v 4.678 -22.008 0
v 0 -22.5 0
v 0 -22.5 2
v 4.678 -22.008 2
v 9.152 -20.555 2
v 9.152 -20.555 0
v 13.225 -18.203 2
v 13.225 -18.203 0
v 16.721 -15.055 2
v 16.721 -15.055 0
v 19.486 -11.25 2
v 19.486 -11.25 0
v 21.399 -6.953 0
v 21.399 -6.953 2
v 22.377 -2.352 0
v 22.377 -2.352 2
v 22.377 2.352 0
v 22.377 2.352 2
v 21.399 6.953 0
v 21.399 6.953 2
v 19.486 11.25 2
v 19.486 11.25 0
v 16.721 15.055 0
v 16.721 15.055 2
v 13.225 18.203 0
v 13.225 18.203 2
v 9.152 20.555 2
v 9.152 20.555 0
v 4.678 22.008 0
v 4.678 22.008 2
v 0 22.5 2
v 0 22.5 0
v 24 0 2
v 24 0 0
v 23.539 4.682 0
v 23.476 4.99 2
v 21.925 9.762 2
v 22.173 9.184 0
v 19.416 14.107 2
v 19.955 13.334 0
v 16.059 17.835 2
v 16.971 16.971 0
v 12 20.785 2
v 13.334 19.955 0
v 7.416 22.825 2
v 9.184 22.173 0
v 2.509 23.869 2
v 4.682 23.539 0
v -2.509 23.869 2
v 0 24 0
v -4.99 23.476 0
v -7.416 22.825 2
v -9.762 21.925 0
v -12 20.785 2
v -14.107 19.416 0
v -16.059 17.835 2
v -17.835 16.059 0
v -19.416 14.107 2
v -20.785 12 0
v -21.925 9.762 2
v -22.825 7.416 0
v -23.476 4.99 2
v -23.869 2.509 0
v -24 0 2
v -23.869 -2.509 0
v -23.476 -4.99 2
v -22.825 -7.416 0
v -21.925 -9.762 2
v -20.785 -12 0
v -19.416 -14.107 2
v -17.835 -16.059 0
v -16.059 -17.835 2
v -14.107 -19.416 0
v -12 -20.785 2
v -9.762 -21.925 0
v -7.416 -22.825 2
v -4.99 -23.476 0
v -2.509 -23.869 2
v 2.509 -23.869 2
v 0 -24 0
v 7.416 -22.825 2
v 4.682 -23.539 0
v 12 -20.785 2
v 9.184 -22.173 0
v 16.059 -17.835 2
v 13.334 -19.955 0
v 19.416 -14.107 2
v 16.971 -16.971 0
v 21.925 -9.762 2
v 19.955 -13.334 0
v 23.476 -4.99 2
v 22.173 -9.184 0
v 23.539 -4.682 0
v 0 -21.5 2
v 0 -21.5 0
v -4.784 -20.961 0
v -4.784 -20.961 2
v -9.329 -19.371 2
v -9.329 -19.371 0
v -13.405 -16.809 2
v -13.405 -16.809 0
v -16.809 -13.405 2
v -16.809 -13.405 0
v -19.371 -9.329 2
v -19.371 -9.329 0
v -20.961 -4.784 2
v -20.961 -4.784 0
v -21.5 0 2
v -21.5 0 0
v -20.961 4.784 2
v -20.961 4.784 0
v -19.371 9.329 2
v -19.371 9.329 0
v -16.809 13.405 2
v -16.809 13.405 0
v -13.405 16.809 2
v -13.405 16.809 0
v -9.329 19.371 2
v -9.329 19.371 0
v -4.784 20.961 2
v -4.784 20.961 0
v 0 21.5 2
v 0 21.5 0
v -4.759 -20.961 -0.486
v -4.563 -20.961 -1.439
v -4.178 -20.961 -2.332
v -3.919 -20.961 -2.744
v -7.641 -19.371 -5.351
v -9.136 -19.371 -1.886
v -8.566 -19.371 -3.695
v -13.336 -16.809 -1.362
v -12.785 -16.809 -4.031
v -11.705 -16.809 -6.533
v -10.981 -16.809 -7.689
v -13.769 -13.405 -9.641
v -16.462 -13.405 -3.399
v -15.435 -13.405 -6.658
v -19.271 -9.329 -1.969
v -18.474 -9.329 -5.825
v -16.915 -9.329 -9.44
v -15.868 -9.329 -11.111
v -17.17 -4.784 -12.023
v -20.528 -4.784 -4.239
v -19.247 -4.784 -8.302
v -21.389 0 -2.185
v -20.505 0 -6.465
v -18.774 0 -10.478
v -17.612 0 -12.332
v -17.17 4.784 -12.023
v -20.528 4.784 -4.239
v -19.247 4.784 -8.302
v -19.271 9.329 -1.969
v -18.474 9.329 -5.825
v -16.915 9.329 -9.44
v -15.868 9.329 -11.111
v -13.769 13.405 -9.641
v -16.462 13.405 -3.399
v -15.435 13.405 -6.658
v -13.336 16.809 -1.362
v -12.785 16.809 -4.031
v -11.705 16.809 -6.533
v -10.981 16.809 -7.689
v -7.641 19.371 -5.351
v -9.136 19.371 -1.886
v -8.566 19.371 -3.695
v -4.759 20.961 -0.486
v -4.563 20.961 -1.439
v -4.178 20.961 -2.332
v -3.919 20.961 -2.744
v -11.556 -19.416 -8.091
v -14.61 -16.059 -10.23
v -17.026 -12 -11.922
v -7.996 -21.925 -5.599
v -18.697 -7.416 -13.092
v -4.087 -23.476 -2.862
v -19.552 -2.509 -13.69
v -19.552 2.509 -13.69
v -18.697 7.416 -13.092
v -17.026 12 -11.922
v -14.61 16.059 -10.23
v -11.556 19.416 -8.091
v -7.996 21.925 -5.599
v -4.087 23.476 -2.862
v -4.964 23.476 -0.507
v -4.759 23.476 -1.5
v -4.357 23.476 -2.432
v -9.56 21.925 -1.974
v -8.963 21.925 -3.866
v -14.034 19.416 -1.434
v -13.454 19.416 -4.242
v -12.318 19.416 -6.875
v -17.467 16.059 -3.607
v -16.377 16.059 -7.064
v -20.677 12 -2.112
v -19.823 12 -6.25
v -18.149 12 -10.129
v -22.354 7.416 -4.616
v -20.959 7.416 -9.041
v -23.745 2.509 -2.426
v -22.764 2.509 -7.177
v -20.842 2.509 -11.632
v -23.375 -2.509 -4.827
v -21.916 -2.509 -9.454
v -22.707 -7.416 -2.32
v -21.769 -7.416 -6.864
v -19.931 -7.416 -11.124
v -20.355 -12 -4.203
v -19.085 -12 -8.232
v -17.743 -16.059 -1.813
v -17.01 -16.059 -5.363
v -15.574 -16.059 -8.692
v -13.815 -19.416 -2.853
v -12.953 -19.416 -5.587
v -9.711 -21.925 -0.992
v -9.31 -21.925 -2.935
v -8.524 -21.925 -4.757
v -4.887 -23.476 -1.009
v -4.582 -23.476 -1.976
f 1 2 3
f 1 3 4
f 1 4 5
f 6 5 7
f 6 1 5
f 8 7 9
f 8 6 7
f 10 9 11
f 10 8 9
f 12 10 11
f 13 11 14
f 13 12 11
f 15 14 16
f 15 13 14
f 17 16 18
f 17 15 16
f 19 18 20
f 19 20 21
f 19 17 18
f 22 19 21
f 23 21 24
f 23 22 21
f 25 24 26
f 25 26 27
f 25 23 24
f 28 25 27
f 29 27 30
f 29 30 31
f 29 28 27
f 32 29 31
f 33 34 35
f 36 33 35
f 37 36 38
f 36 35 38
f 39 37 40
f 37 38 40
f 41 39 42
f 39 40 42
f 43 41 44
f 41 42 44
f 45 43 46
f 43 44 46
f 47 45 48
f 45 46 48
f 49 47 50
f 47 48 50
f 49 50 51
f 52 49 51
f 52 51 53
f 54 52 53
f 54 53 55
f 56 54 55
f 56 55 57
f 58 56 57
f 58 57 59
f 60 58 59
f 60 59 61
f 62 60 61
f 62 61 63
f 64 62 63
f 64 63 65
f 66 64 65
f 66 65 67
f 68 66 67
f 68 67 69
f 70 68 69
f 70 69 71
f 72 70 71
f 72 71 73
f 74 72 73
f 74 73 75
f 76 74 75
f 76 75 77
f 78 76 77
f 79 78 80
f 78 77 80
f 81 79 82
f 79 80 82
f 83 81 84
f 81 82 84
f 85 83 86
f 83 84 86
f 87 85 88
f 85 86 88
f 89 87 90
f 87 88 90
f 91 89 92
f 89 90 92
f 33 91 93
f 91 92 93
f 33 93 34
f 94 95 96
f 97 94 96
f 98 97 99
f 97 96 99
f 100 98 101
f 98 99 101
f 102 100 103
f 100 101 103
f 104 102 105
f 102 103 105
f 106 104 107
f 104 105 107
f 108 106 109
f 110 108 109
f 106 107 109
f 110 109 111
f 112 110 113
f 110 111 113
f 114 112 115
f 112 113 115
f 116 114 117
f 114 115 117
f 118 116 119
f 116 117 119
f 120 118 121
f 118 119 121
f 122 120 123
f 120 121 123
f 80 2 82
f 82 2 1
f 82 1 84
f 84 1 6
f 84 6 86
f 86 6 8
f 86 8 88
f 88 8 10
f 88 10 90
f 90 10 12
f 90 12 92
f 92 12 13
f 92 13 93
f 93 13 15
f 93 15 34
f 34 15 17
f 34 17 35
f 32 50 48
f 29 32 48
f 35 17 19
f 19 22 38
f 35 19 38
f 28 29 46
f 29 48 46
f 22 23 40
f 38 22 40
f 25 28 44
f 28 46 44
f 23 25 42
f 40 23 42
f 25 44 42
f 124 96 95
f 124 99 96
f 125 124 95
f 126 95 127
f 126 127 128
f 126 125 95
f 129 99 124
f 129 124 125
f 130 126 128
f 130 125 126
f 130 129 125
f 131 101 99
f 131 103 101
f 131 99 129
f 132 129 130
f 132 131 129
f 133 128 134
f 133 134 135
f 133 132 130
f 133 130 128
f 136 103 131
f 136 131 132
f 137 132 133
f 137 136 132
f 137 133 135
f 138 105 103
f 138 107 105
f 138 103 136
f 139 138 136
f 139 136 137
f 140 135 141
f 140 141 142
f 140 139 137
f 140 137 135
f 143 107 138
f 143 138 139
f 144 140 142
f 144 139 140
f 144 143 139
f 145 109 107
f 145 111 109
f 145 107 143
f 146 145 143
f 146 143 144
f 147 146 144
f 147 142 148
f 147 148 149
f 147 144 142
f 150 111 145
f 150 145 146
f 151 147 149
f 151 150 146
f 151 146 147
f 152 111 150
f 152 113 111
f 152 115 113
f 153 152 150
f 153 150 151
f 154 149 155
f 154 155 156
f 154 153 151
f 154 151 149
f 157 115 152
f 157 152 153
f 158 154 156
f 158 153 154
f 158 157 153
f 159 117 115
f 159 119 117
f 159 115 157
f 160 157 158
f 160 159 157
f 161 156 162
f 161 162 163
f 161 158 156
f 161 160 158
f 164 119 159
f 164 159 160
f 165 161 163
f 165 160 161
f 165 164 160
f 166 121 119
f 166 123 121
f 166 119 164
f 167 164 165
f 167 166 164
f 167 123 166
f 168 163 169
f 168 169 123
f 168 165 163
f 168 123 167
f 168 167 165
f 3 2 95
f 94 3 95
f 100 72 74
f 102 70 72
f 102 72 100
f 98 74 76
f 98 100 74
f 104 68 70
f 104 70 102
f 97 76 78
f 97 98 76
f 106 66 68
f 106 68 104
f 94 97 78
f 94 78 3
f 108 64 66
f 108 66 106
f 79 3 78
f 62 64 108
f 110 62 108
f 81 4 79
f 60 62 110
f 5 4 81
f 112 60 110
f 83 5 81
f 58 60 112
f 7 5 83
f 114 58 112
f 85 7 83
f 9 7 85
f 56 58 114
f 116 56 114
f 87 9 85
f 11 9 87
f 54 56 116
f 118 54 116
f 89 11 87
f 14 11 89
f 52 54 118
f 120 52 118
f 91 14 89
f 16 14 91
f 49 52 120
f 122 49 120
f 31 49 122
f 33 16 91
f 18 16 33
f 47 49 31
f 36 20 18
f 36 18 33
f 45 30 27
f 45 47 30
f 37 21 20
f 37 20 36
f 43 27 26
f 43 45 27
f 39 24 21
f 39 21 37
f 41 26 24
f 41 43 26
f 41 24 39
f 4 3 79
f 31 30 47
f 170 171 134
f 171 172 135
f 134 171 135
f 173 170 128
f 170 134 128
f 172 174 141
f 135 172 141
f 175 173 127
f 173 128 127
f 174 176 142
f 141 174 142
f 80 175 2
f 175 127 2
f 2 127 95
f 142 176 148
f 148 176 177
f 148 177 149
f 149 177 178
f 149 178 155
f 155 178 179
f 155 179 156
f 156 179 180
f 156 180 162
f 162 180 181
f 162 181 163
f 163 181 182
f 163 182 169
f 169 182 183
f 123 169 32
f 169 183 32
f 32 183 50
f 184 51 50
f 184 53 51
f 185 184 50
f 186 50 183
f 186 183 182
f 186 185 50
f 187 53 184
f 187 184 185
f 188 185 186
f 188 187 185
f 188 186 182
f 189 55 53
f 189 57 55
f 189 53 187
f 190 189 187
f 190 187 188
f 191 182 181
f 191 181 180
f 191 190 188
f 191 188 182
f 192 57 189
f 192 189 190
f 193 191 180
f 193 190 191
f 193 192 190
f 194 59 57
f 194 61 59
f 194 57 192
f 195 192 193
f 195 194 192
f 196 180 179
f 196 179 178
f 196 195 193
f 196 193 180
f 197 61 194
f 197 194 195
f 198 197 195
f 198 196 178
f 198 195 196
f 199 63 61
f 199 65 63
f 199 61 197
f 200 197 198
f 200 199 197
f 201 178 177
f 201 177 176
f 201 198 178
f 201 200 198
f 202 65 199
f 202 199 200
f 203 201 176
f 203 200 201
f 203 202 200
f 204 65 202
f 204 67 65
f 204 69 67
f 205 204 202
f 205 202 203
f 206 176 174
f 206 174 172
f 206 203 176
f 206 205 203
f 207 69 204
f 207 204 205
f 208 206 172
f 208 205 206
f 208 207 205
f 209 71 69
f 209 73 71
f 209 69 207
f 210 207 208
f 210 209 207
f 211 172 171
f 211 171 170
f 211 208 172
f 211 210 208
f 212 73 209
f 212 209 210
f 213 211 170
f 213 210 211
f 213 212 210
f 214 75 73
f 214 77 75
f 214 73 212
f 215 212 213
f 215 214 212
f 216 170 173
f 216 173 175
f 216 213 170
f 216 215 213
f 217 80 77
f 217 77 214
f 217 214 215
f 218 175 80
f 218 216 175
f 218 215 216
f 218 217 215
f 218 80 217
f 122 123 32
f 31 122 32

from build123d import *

# Parameters (mm, degrees)
F0_R     = 24
F0_R_2   = 22.5
F1_DEPTH = 2
F3_ANGLE = 35
F4_DEPTH = 2


with BuildPart() as f1:
    # F0 (on Top) → F1 (new body)
    with BuildSketch(Plane.XY):
        Circle(F0_R)
        Circle(F0_R_2, mode=Mode.SUBTRACT)
    extrude(amount=F1_DEPTH)

    # F2 (on Top) → F3 (revolve)
    with BuildSketch(Plane.XY):
        with BuildLine():
            Line((0, 21.5), (0, 24))
            ThreePointArc((0, 24), (-24, 0), (0, -24))
            Line((0, -24), (0, -21.5))
            ThreePointArc((0, -21.5), (-21.5, 0), (0, 21.5))
        make_face()
    revolve(axis=Axis((0, 0, 0), (0, -1, 0)), revolution_arc=F3_ANGLE)

    # F2 (on Top) → F4 (join)
    with BuildSketch(Plane.XY):
        with BuildLine():
            Line((0, 21.5), (0, 24))
            ThreePointArc((0, 24), (-24, 0), (0, -24))
            Line((0, -24), (0, -21.5))
            ThreePointArc((0, -21.5), (-21.5, 0), (0, 21.5))
        make_face()
    extrude(amount=F4_DEPTH)


solid = f1.part
